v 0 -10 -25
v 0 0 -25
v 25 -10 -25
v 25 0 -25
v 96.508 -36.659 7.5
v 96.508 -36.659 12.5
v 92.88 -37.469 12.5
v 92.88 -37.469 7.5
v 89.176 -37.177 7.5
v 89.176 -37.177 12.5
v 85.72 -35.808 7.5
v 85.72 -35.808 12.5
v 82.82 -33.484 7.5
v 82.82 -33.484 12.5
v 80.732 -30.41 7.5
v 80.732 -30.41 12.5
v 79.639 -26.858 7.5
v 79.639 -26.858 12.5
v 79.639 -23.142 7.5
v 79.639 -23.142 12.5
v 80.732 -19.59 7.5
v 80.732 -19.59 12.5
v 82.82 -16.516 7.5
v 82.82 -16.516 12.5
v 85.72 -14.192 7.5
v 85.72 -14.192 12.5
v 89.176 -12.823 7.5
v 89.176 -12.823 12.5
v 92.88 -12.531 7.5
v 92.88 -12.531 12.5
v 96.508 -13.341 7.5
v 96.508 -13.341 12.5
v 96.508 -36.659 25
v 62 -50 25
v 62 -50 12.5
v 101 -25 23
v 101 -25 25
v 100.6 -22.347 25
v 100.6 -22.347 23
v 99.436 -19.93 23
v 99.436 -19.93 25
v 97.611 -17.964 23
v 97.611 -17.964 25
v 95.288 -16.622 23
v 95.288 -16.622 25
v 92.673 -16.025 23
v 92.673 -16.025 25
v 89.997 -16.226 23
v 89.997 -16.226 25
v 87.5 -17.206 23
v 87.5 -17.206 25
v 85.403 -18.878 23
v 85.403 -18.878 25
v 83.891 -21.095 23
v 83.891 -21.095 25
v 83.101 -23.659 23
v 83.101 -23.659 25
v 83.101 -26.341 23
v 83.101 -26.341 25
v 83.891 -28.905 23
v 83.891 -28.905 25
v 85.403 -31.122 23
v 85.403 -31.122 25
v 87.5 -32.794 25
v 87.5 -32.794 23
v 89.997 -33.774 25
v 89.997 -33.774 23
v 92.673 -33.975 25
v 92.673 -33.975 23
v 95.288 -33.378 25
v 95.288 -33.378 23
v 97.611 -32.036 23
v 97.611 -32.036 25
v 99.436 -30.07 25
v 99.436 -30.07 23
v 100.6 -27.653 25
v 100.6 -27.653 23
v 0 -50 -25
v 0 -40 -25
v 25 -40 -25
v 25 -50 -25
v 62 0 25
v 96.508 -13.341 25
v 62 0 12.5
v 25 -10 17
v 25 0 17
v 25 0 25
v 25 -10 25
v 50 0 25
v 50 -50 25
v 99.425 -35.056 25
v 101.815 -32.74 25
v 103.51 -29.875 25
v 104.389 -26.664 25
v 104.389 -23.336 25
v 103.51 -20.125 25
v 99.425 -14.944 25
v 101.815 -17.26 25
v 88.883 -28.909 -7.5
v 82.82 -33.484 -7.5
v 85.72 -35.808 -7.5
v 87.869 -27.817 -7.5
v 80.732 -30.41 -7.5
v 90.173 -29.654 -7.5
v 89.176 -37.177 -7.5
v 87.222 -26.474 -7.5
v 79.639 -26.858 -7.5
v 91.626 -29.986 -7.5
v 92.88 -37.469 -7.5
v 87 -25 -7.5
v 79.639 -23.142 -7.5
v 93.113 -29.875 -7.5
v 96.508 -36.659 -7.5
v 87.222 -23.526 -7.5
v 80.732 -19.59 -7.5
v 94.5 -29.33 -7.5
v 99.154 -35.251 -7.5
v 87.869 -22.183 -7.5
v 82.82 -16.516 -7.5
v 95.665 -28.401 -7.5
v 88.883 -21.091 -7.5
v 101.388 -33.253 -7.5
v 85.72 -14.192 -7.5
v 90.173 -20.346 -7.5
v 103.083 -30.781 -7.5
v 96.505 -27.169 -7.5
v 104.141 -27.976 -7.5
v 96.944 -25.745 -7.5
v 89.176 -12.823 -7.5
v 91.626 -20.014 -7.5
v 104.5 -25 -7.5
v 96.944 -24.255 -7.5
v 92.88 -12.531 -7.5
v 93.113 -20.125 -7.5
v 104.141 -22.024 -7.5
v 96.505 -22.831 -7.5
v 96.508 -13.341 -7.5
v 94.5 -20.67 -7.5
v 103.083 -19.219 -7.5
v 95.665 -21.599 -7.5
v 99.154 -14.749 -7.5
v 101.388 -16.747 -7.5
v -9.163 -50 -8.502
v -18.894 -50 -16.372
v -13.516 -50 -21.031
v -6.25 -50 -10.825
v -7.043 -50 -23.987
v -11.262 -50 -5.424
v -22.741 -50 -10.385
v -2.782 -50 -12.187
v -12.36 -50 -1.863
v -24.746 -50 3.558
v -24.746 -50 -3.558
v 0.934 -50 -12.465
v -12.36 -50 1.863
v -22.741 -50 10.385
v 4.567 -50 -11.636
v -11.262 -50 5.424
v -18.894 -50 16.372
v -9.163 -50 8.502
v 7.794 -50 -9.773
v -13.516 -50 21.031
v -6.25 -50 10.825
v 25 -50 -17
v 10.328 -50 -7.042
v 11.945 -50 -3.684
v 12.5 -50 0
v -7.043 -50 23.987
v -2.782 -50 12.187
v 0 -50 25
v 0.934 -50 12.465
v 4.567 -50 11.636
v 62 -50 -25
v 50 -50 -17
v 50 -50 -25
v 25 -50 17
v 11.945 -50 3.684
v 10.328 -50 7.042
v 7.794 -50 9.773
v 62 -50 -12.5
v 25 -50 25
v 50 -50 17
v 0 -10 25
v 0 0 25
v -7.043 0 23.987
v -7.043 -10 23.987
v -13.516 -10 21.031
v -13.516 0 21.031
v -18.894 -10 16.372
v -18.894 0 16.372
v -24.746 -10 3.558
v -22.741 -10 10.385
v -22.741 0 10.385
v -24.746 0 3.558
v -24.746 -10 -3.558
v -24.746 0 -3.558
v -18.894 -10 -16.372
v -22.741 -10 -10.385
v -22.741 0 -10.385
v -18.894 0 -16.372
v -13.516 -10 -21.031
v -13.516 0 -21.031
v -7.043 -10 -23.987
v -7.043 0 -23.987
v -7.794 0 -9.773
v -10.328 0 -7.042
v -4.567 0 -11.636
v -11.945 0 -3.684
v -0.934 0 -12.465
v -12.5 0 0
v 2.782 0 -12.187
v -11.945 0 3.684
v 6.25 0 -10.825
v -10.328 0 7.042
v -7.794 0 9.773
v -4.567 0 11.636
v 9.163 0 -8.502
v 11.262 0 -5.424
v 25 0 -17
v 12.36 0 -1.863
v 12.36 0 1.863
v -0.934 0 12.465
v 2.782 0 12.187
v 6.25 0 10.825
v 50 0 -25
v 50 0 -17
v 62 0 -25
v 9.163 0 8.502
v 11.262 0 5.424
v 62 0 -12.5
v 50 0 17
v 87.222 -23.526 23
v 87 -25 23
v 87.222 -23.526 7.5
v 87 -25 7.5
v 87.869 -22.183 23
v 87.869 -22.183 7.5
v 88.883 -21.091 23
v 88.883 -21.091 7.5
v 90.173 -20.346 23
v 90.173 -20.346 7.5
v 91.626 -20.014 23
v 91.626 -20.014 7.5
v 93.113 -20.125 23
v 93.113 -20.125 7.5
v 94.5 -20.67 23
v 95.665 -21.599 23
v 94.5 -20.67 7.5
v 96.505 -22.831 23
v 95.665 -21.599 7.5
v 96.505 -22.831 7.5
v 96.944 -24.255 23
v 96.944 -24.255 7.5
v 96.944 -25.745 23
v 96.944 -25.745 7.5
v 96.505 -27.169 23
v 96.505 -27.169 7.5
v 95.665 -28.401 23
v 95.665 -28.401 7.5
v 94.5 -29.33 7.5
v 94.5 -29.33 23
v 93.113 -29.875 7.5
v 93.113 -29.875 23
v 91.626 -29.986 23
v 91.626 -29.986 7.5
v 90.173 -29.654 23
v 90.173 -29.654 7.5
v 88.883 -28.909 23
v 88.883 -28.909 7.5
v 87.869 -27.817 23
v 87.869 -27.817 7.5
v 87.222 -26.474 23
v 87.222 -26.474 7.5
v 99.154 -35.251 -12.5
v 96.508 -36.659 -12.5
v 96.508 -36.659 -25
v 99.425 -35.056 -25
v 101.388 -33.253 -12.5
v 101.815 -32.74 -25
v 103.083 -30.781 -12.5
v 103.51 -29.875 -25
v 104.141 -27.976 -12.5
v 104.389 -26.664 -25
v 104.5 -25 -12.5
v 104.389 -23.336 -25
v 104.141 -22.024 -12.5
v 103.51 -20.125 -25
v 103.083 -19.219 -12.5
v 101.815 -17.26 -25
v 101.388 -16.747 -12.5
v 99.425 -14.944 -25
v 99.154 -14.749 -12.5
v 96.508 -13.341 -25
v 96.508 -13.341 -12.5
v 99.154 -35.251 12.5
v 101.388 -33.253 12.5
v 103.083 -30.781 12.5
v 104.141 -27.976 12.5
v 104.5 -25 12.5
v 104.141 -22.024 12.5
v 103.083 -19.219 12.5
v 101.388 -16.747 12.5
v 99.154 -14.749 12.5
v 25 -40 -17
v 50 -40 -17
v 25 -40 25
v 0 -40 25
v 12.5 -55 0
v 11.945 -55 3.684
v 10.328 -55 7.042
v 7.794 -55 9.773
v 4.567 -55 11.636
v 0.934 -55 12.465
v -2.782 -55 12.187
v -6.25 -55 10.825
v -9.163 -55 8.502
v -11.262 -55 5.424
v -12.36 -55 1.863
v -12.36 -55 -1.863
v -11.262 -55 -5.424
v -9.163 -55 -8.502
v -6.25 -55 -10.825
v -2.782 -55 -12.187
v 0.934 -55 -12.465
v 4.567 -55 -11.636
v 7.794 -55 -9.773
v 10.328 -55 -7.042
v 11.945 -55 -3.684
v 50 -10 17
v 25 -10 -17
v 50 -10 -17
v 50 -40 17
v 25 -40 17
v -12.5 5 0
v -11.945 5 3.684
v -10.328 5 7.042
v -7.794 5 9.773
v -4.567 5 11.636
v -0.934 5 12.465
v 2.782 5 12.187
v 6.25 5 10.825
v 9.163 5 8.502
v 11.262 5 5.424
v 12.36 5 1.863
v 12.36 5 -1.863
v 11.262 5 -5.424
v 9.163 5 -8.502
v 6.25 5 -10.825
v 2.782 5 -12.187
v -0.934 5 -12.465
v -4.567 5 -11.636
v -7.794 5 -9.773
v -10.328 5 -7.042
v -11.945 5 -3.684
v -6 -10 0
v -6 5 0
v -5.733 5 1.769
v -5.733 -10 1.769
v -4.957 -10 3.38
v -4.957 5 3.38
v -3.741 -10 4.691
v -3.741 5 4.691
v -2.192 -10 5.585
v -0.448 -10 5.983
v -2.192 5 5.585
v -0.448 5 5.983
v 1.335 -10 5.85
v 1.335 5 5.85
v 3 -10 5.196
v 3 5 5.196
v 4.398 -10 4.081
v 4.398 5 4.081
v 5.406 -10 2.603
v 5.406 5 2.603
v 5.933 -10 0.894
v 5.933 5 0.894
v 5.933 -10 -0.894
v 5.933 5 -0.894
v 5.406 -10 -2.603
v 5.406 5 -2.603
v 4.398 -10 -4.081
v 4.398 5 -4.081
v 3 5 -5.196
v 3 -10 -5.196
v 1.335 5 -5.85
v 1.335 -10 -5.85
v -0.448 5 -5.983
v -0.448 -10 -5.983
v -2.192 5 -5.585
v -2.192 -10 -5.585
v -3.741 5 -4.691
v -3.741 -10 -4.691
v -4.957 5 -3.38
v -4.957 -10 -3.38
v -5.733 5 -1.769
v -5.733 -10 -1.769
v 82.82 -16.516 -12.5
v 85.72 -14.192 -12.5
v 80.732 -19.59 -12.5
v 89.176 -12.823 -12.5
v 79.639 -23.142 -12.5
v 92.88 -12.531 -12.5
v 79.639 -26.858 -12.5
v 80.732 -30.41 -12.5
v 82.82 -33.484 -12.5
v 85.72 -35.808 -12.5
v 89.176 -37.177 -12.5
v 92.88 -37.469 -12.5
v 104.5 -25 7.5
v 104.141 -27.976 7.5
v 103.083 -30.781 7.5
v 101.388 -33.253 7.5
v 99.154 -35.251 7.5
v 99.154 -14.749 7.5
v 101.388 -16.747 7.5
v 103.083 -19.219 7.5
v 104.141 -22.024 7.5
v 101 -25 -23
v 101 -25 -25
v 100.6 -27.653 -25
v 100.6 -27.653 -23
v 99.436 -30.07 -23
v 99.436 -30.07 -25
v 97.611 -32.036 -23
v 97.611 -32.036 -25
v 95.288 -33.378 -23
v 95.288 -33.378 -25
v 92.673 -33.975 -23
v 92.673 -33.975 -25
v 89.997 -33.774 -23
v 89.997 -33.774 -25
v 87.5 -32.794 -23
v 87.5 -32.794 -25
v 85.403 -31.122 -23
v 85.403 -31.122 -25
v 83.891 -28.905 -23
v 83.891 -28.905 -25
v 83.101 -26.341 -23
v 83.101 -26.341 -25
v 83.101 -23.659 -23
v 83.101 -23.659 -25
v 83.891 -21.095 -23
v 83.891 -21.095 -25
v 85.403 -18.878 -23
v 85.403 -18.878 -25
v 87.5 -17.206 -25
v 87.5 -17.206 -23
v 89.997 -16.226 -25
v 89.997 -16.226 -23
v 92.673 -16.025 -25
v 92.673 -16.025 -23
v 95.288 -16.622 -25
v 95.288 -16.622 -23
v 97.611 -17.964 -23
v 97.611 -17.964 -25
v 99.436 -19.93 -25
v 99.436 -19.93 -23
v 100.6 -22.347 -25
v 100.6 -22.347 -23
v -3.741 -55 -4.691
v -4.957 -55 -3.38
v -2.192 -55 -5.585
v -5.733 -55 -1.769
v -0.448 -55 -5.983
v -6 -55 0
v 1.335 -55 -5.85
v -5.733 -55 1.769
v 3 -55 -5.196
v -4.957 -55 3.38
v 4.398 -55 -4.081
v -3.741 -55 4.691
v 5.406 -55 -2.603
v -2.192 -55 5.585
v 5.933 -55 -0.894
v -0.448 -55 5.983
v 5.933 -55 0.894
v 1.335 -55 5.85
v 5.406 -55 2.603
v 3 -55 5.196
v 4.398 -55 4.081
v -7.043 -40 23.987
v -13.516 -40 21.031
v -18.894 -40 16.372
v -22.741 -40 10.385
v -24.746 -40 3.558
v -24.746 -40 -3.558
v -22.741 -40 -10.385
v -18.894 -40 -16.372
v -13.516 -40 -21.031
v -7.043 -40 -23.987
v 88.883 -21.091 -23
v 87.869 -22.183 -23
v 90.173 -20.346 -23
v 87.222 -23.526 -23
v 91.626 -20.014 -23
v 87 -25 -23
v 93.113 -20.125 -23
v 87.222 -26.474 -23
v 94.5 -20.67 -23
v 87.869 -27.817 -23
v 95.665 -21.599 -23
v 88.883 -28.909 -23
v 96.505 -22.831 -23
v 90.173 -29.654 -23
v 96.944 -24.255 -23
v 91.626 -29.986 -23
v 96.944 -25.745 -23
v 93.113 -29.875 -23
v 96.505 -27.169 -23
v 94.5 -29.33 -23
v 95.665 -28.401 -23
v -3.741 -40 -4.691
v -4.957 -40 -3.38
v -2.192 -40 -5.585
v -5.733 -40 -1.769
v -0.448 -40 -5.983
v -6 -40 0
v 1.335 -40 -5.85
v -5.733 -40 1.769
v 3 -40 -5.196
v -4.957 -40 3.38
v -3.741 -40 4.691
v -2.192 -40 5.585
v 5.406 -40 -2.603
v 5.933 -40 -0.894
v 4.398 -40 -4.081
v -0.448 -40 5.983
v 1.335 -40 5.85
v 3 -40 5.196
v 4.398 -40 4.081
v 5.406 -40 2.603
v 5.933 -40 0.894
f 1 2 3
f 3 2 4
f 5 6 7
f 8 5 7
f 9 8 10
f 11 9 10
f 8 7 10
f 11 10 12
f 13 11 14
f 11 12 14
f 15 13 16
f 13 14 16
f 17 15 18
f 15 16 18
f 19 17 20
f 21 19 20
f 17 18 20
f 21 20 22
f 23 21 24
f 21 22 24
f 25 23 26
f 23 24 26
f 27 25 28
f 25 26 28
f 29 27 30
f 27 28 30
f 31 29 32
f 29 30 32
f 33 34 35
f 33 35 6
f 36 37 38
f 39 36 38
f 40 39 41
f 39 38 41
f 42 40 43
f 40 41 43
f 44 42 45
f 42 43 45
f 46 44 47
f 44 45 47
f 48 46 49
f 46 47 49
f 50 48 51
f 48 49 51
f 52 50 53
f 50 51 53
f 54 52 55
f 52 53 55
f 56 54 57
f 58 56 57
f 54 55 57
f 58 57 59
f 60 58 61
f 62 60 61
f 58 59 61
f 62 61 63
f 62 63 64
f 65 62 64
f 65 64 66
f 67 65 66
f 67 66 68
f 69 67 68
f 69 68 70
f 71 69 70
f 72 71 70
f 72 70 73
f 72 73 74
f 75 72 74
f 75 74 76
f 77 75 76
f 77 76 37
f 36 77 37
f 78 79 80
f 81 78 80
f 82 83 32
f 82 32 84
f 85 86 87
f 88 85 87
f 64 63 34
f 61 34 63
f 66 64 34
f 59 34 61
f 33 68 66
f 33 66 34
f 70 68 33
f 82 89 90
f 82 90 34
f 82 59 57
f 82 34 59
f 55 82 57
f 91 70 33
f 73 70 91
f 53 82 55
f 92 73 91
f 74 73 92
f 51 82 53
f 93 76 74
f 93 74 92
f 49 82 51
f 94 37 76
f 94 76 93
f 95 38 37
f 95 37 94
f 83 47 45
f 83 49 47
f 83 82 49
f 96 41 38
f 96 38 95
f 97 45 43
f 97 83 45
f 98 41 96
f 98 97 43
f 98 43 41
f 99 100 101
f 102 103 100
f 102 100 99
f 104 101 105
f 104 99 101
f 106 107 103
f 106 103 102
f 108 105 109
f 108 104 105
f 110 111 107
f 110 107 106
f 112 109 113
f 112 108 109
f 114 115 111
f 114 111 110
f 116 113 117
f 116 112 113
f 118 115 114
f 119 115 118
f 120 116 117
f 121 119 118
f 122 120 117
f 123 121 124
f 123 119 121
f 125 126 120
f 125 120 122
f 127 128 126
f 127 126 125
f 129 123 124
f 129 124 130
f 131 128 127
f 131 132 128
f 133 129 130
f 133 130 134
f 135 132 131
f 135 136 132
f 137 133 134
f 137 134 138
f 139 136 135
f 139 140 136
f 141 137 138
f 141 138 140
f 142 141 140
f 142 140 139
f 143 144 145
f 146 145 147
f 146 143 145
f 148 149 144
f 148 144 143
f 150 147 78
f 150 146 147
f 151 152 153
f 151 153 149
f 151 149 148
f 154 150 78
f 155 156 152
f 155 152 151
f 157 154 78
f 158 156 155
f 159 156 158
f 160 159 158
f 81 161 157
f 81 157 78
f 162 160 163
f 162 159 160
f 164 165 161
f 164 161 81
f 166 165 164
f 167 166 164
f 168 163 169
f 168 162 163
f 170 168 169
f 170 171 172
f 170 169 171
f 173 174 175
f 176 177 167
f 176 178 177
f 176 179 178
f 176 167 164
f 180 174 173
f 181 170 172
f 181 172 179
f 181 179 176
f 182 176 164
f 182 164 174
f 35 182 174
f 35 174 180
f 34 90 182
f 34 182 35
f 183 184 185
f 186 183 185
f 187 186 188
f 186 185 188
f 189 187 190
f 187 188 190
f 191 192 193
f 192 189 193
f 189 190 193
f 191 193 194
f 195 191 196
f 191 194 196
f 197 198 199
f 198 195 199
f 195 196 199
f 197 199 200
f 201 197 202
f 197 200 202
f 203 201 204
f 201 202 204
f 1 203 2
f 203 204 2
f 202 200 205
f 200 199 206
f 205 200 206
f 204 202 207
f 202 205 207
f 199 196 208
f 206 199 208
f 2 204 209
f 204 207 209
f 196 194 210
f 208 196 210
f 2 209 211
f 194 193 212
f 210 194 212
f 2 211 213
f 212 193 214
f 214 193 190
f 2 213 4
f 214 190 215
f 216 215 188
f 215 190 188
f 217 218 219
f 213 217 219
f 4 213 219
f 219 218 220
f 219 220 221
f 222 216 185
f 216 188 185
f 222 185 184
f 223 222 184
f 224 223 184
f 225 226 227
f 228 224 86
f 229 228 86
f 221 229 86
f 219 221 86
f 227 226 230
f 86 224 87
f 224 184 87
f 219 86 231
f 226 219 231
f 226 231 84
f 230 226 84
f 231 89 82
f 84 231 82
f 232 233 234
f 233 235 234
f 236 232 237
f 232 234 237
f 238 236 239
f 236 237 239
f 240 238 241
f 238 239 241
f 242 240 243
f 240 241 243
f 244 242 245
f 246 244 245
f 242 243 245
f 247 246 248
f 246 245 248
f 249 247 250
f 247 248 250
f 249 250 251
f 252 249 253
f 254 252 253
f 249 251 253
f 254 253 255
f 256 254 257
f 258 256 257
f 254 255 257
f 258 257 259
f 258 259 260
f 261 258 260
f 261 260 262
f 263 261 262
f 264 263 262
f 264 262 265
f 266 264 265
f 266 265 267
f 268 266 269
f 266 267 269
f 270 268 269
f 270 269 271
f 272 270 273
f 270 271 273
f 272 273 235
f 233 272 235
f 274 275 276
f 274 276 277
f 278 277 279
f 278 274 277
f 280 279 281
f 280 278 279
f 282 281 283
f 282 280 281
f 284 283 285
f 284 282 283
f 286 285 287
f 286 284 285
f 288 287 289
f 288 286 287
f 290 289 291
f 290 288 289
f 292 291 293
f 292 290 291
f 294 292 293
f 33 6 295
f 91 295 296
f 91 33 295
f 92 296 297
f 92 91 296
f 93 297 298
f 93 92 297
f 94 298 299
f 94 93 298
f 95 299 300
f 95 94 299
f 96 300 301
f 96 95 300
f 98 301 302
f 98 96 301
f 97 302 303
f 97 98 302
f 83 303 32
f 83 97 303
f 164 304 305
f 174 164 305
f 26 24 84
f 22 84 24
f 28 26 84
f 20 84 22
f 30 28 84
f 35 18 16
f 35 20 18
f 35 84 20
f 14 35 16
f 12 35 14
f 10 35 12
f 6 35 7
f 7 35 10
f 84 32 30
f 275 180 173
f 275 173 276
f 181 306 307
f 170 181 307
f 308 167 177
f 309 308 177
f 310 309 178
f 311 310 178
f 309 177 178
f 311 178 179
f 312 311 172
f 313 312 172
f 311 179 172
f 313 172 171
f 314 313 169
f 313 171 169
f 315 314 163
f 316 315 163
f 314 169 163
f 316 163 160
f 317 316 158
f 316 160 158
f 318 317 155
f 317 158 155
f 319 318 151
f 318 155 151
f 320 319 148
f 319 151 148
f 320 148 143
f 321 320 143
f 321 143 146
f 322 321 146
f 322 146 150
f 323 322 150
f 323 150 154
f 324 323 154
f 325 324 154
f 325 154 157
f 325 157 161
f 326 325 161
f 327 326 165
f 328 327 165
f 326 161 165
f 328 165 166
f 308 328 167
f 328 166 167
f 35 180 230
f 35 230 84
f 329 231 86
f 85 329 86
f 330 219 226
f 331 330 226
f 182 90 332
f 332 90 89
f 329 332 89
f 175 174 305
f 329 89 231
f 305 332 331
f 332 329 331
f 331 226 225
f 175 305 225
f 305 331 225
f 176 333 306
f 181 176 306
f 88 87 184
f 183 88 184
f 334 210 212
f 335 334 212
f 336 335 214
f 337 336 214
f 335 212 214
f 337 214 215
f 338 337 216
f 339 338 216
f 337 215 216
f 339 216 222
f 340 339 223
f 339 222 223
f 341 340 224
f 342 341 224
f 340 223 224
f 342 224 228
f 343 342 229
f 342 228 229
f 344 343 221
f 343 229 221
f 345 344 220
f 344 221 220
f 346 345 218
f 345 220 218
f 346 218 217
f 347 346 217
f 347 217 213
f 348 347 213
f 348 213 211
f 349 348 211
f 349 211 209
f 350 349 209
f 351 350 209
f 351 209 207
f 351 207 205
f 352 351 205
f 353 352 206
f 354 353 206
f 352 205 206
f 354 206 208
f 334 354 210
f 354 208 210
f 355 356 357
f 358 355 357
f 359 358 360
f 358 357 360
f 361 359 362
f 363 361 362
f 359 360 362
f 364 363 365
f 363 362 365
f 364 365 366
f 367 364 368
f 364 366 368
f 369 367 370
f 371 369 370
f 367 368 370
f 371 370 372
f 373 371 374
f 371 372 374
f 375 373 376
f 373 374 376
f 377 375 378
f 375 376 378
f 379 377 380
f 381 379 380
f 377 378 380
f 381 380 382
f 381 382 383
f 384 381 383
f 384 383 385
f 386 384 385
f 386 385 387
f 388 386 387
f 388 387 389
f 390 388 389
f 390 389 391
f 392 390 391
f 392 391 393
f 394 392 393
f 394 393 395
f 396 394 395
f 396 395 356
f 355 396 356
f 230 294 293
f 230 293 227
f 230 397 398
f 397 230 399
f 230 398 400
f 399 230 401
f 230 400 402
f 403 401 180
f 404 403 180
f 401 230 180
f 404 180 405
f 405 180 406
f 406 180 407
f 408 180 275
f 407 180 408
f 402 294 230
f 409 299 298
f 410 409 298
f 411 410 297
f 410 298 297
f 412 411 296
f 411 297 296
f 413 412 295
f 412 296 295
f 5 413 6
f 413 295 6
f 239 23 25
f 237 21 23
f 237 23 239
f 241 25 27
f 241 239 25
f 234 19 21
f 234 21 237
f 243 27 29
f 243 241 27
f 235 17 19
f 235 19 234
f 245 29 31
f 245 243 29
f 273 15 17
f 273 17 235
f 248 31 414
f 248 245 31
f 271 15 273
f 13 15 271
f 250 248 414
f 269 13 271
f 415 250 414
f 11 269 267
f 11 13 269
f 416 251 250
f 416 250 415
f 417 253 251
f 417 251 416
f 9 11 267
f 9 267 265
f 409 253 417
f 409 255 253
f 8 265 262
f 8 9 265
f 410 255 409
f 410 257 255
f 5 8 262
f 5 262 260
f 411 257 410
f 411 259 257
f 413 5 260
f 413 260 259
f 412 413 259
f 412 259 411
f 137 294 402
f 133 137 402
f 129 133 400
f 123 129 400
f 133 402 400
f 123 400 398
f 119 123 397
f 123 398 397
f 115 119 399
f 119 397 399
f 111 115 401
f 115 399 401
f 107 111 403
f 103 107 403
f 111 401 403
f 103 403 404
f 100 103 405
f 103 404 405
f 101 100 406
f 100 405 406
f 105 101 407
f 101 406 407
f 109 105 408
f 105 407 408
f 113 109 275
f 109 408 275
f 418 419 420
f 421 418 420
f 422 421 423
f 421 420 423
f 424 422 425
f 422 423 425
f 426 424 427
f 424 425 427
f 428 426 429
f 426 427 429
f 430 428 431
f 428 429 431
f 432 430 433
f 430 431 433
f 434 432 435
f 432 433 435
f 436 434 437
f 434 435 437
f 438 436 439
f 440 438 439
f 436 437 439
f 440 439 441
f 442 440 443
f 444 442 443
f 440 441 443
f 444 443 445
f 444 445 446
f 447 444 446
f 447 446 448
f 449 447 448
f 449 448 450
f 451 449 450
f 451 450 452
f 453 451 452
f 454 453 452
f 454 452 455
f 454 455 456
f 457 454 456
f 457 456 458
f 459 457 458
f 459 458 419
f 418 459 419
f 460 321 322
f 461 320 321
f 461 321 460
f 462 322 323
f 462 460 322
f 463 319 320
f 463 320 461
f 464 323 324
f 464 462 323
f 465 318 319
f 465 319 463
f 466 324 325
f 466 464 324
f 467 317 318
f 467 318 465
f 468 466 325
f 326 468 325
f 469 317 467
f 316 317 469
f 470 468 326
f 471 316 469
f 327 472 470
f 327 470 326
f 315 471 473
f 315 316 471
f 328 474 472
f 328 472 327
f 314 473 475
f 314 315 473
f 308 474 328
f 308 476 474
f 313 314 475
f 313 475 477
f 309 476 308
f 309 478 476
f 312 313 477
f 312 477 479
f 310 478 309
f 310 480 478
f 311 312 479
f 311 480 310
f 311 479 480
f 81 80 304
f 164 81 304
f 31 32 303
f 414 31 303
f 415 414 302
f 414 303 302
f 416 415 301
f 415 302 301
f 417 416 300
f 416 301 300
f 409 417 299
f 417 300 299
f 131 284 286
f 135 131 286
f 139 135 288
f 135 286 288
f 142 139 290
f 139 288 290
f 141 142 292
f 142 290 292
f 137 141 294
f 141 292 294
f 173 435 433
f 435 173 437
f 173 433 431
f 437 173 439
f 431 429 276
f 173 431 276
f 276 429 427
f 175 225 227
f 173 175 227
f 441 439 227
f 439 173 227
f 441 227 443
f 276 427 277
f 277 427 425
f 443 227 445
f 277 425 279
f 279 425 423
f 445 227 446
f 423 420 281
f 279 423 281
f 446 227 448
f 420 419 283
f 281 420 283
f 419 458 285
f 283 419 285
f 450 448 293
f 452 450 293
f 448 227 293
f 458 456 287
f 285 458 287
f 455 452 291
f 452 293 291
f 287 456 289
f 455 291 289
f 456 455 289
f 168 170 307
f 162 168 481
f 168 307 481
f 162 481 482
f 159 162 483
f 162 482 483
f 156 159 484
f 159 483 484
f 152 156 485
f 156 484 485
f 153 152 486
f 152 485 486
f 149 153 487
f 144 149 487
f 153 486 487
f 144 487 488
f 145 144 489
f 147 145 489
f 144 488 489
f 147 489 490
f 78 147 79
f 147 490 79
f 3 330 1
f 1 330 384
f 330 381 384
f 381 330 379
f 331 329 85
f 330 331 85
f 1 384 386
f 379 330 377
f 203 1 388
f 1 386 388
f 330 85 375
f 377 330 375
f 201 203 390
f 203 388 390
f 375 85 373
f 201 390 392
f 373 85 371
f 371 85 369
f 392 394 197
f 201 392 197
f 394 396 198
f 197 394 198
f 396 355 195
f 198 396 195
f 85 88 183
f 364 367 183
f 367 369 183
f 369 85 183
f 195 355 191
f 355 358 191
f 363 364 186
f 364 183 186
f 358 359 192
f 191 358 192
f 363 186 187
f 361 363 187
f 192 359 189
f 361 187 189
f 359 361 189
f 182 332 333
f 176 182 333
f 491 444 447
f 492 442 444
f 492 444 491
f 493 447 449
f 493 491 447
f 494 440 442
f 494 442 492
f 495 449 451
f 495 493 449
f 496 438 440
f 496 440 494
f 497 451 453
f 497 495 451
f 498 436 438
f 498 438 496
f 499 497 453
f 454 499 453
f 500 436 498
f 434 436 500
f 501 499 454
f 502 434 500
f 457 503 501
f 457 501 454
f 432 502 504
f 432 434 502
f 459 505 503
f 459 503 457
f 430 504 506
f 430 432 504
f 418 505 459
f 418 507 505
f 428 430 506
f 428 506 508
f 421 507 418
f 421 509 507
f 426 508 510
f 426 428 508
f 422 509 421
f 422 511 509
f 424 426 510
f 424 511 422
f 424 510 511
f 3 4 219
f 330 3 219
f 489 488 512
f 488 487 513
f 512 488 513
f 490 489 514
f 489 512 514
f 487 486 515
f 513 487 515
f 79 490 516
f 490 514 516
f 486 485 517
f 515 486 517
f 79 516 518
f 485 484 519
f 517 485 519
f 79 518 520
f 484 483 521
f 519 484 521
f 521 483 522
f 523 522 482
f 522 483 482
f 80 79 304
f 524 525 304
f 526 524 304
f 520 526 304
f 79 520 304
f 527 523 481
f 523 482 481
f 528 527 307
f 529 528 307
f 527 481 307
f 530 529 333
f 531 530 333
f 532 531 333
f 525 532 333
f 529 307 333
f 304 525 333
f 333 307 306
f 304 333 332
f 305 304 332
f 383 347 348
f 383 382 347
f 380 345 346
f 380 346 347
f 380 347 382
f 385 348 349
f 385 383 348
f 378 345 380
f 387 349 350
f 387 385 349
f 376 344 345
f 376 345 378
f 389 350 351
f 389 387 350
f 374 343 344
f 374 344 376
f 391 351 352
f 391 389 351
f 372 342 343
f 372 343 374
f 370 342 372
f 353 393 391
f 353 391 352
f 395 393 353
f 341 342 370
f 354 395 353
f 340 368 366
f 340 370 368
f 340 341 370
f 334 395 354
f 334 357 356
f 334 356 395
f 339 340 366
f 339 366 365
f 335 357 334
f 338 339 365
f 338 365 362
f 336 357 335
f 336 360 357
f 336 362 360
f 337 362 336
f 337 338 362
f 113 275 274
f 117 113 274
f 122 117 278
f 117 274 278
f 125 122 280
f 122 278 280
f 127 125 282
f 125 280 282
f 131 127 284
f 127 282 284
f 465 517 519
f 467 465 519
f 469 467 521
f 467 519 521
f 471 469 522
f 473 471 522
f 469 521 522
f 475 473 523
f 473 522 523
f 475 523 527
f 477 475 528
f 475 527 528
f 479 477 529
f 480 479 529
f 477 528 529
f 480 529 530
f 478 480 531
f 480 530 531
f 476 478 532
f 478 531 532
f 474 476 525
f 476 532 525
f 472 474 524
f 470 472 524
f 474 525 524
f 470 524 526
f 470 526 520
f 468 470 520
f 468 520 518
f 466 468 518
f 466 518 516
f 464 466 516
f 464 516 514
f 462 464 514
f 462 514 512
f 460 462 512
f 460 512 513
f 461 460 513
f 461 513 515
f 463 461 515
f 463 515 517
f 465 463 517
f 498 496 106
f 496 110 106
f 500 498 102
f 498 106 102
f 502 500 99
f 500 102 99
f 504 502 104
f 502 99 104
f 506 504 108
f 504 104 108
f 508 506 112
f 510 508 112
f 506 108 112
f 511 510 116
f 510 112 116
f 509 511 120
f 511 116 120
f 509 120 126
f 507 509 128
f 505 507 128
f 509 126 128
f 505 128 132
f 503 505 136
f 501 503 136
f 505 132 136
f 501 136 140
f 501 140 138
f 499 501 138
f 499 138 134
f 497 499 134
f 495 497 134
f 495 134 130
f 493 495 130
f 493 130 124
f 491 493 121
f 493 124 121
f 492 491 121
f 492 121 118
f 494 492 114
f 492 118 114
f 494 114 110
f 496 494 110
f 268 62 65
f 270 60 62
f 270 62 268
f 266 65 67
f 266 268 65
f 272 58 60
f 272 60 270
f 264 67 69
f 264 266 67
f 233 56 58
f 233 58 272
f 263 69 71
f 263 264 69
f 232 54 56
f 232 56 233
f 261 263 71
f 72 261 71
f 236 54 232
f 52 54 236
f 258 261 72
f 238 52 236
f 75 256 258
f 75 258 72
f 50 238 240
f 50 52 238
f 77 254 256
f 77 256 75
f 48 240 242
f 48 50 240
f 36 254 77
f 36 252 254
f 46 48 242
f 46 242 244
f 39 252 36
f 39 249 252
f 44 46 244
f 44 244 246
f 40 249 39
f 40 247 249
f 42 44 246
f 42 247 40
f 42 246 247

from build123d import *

# Parameters (mm, degrees)
F1_DEPTH        = 50
F2_W            = 25
F2_H            = 30
F3_DEPTH        = 50.001
F5_DEPTH        = 50
F6_W            = 42.5
F6_H            = 25
F7_DEPTH        = 50.001
F8_R            = 12.5
F9_DEPTH        = 5
F10_R           = 12.5
F11_DEPTH       = 5
F12_R           = 6
F13_DEPTH       = 201
F15_D           = 12
F17_DEPTH       = 5
F19_DEPTH       = 5
F21_D           = 10
F21_DEPTH       = 17.5
F21_CBORE_D     = 18
F21_CBORE_DEPTH = 2
F21_TIP         = 3.0043030951
F23_D           = 10
F23_DEPTH       = 17.5
F23_CBORE_D     = 18
F23_CBORE_DEPTH = 2
F23_TIP         = 3.0043030951


# Not quite as in the source:
# - an extrude ends at something that could not be found from the text; its depth is read off the source's solid


with BuildPart() as f1:
    # F0 (on Front) → F1 (new body)
    with BuildSketch(Plane.XZ):
        with BuildLine():
            Line((25, 25), (0, 25))
            ThreePointArc((0, 25), (-25, 0), (0, -25))
            Line((0, -25), (25, -25))
            Line((25, -25), (25, -17))
            Line((25, -17), (50, -17))
            Line((50, -17), (50, -25))
            Line((50, -25), (62, -25))
            Line((62, -25), (62, 0))
            Line((62, 0), (62, 25))
            Line((62, 25), (50, 25))
            Line((50, 25), (50, 17))
            Line((50, 17), (25, 17))
            Line((25, 17), (25, 25))
        make_face()
    extrude(amount=F1_DEPTH)

    # F2 (on face) → F3 (cut, through all)
    with BuildSketch(Plane.XY.offset(25)):
        with Locations((-12.5, -25)):
            Rectangle(F2_W, F2_H)
        with Locations((12.5, -25)):
            Rectangle(F2_W, F2_H)
        with Locations((37.5, -25)):
            Rectangle(F2_W, F2_H)
    extrude(amount=-F3_DEPTH, mode=Mode.SUBTRACT)

    # F4 (on face) → F5 (join)
    with BuildSketch(Plane.XY.offset(25)):
        with BuildLine():
            Line((62, -50), (96.5075043991, -36.6590052789))
            ThreePointArc((96.5075043991, -36.6590052789), (104.5, -25), (96.5075043991, -13.3409947211))
            Line((96.5075043991, -13.3409947211), (62, 0))
            Line((62, 0), (62, -50))
        make_face()
    extrude(amount=-F5_DEPTH)

    # F6 (on face) → F7 (cut, through all)
    with BuildSketch(Plane.XZ.offset(50)):
        with Locations((83.25, 0)):
            Rectangle(F6_W, F6_H)
    extrude(amount=-F7_DEPTH, mode=Mode.SUBTRACT)

    # F8 (on face) → F9 (join)
    with BuildSketch(Plane.XZ.offset(50)):
        Circle(F8_R)
    extrude(amount=F9_DEPTH)

    # F10 (on face) → F11 (join)
    with BuildSketch(Plane(origin=(0, 0, 0), x_dir=(-1, 0, 0), z_dir=(0, 1, 0))):
        Circle(F10_R)
    extrude(amount=F11_DEPTH)

    # F12 (on face) → F13 (cut, through all)
    with BuildSketch(Plane(origin=(0, 5, 0), x_dir=(-1, 0, 0), z_dir=(0, 1, 0))):
        Circle(F12_R)
    extrude(amount=F13_DEPTH, mode=Mode.SUBTRACT)

    # F15 (through all)
    with Locations(Plane.XZ.offset(55)):
        with Locations((0, 0)):
            Hole(F15_D / 2)

    # F16 (on face) → F17 (join)
    with BuildSketch(Plane.XY.offset(-12.5)):
        with BuildLine():
            ThreePointArc((96.5075043991, -36.6590052789), (102.3100389182, -32.0677505266), (104.5, -25))
            ThreePointArc((104.5, -25), (102.3100389182, -17.9322494734), (96.5075043991, -13.3409947211))
            ThreePointArc((96.5075043991, -13.3409947211), (79.5, -25), (96.5075043991, -36.6590052789))
        make_face()
    extrude(amount=F17_DEPTH)

    # F18 (on face) → F19 (join)
    with BuildSketch(Plane(origin=(0, 0, 12.5), x_dir=(1, 0, 0), z_dir=(0, 0, -1))):
        with BuildLine():
            ThreePointArc((96.5075043991, 13.3409947211), (102.3100389182, 17.9322494734), (104.5, 25))
            ThreePointArc((104.5, 25), (102.3100389182, 32.0677505266), (96.5075043991, 36.6590052789))
            ThreePointArc((96.5075043991, 36.6590052789), (79.5, 25), (96.5075043991, 13.3409947211))
        make_face()
    extrude(amount=F19_DEPTH)

    # F21
    with Locations(Plane.XY.offset(25)):
        with Locations((92, -25)):
            CounterBoreHole(F21_D / 2, F21_CBORE_D / 2, F21_CBORE_DEPTH, depth=F21_DEPTH)
            with Locations((0, 0, -(F21_DEPTH + F21_TIP / 2))):  # 118° drill point
                Cone(0, F21_D / 2, F21_TIP, mode=Mode.SUBTRACT)

    # F23
    with Locations(Plane(origin=(0, 0, -25), x_dir=(1, 0, 0), z_dir=(0, 0, -1))):
        with Locations((92, 25)):
            CounterBoreHole(F23_D / 2, F23_CBORE_D / 2, F23_CBORE_DEPTH, depth=F23_DEPTH)
            with Locations((0, 0, -(F23_DEPTH + F23_TIP / 2))):  # 118° drill point
                Cone(0, F23_D / 2, F23_TIP, mode=Mode.SUBTRACT)


solid = f1.part
